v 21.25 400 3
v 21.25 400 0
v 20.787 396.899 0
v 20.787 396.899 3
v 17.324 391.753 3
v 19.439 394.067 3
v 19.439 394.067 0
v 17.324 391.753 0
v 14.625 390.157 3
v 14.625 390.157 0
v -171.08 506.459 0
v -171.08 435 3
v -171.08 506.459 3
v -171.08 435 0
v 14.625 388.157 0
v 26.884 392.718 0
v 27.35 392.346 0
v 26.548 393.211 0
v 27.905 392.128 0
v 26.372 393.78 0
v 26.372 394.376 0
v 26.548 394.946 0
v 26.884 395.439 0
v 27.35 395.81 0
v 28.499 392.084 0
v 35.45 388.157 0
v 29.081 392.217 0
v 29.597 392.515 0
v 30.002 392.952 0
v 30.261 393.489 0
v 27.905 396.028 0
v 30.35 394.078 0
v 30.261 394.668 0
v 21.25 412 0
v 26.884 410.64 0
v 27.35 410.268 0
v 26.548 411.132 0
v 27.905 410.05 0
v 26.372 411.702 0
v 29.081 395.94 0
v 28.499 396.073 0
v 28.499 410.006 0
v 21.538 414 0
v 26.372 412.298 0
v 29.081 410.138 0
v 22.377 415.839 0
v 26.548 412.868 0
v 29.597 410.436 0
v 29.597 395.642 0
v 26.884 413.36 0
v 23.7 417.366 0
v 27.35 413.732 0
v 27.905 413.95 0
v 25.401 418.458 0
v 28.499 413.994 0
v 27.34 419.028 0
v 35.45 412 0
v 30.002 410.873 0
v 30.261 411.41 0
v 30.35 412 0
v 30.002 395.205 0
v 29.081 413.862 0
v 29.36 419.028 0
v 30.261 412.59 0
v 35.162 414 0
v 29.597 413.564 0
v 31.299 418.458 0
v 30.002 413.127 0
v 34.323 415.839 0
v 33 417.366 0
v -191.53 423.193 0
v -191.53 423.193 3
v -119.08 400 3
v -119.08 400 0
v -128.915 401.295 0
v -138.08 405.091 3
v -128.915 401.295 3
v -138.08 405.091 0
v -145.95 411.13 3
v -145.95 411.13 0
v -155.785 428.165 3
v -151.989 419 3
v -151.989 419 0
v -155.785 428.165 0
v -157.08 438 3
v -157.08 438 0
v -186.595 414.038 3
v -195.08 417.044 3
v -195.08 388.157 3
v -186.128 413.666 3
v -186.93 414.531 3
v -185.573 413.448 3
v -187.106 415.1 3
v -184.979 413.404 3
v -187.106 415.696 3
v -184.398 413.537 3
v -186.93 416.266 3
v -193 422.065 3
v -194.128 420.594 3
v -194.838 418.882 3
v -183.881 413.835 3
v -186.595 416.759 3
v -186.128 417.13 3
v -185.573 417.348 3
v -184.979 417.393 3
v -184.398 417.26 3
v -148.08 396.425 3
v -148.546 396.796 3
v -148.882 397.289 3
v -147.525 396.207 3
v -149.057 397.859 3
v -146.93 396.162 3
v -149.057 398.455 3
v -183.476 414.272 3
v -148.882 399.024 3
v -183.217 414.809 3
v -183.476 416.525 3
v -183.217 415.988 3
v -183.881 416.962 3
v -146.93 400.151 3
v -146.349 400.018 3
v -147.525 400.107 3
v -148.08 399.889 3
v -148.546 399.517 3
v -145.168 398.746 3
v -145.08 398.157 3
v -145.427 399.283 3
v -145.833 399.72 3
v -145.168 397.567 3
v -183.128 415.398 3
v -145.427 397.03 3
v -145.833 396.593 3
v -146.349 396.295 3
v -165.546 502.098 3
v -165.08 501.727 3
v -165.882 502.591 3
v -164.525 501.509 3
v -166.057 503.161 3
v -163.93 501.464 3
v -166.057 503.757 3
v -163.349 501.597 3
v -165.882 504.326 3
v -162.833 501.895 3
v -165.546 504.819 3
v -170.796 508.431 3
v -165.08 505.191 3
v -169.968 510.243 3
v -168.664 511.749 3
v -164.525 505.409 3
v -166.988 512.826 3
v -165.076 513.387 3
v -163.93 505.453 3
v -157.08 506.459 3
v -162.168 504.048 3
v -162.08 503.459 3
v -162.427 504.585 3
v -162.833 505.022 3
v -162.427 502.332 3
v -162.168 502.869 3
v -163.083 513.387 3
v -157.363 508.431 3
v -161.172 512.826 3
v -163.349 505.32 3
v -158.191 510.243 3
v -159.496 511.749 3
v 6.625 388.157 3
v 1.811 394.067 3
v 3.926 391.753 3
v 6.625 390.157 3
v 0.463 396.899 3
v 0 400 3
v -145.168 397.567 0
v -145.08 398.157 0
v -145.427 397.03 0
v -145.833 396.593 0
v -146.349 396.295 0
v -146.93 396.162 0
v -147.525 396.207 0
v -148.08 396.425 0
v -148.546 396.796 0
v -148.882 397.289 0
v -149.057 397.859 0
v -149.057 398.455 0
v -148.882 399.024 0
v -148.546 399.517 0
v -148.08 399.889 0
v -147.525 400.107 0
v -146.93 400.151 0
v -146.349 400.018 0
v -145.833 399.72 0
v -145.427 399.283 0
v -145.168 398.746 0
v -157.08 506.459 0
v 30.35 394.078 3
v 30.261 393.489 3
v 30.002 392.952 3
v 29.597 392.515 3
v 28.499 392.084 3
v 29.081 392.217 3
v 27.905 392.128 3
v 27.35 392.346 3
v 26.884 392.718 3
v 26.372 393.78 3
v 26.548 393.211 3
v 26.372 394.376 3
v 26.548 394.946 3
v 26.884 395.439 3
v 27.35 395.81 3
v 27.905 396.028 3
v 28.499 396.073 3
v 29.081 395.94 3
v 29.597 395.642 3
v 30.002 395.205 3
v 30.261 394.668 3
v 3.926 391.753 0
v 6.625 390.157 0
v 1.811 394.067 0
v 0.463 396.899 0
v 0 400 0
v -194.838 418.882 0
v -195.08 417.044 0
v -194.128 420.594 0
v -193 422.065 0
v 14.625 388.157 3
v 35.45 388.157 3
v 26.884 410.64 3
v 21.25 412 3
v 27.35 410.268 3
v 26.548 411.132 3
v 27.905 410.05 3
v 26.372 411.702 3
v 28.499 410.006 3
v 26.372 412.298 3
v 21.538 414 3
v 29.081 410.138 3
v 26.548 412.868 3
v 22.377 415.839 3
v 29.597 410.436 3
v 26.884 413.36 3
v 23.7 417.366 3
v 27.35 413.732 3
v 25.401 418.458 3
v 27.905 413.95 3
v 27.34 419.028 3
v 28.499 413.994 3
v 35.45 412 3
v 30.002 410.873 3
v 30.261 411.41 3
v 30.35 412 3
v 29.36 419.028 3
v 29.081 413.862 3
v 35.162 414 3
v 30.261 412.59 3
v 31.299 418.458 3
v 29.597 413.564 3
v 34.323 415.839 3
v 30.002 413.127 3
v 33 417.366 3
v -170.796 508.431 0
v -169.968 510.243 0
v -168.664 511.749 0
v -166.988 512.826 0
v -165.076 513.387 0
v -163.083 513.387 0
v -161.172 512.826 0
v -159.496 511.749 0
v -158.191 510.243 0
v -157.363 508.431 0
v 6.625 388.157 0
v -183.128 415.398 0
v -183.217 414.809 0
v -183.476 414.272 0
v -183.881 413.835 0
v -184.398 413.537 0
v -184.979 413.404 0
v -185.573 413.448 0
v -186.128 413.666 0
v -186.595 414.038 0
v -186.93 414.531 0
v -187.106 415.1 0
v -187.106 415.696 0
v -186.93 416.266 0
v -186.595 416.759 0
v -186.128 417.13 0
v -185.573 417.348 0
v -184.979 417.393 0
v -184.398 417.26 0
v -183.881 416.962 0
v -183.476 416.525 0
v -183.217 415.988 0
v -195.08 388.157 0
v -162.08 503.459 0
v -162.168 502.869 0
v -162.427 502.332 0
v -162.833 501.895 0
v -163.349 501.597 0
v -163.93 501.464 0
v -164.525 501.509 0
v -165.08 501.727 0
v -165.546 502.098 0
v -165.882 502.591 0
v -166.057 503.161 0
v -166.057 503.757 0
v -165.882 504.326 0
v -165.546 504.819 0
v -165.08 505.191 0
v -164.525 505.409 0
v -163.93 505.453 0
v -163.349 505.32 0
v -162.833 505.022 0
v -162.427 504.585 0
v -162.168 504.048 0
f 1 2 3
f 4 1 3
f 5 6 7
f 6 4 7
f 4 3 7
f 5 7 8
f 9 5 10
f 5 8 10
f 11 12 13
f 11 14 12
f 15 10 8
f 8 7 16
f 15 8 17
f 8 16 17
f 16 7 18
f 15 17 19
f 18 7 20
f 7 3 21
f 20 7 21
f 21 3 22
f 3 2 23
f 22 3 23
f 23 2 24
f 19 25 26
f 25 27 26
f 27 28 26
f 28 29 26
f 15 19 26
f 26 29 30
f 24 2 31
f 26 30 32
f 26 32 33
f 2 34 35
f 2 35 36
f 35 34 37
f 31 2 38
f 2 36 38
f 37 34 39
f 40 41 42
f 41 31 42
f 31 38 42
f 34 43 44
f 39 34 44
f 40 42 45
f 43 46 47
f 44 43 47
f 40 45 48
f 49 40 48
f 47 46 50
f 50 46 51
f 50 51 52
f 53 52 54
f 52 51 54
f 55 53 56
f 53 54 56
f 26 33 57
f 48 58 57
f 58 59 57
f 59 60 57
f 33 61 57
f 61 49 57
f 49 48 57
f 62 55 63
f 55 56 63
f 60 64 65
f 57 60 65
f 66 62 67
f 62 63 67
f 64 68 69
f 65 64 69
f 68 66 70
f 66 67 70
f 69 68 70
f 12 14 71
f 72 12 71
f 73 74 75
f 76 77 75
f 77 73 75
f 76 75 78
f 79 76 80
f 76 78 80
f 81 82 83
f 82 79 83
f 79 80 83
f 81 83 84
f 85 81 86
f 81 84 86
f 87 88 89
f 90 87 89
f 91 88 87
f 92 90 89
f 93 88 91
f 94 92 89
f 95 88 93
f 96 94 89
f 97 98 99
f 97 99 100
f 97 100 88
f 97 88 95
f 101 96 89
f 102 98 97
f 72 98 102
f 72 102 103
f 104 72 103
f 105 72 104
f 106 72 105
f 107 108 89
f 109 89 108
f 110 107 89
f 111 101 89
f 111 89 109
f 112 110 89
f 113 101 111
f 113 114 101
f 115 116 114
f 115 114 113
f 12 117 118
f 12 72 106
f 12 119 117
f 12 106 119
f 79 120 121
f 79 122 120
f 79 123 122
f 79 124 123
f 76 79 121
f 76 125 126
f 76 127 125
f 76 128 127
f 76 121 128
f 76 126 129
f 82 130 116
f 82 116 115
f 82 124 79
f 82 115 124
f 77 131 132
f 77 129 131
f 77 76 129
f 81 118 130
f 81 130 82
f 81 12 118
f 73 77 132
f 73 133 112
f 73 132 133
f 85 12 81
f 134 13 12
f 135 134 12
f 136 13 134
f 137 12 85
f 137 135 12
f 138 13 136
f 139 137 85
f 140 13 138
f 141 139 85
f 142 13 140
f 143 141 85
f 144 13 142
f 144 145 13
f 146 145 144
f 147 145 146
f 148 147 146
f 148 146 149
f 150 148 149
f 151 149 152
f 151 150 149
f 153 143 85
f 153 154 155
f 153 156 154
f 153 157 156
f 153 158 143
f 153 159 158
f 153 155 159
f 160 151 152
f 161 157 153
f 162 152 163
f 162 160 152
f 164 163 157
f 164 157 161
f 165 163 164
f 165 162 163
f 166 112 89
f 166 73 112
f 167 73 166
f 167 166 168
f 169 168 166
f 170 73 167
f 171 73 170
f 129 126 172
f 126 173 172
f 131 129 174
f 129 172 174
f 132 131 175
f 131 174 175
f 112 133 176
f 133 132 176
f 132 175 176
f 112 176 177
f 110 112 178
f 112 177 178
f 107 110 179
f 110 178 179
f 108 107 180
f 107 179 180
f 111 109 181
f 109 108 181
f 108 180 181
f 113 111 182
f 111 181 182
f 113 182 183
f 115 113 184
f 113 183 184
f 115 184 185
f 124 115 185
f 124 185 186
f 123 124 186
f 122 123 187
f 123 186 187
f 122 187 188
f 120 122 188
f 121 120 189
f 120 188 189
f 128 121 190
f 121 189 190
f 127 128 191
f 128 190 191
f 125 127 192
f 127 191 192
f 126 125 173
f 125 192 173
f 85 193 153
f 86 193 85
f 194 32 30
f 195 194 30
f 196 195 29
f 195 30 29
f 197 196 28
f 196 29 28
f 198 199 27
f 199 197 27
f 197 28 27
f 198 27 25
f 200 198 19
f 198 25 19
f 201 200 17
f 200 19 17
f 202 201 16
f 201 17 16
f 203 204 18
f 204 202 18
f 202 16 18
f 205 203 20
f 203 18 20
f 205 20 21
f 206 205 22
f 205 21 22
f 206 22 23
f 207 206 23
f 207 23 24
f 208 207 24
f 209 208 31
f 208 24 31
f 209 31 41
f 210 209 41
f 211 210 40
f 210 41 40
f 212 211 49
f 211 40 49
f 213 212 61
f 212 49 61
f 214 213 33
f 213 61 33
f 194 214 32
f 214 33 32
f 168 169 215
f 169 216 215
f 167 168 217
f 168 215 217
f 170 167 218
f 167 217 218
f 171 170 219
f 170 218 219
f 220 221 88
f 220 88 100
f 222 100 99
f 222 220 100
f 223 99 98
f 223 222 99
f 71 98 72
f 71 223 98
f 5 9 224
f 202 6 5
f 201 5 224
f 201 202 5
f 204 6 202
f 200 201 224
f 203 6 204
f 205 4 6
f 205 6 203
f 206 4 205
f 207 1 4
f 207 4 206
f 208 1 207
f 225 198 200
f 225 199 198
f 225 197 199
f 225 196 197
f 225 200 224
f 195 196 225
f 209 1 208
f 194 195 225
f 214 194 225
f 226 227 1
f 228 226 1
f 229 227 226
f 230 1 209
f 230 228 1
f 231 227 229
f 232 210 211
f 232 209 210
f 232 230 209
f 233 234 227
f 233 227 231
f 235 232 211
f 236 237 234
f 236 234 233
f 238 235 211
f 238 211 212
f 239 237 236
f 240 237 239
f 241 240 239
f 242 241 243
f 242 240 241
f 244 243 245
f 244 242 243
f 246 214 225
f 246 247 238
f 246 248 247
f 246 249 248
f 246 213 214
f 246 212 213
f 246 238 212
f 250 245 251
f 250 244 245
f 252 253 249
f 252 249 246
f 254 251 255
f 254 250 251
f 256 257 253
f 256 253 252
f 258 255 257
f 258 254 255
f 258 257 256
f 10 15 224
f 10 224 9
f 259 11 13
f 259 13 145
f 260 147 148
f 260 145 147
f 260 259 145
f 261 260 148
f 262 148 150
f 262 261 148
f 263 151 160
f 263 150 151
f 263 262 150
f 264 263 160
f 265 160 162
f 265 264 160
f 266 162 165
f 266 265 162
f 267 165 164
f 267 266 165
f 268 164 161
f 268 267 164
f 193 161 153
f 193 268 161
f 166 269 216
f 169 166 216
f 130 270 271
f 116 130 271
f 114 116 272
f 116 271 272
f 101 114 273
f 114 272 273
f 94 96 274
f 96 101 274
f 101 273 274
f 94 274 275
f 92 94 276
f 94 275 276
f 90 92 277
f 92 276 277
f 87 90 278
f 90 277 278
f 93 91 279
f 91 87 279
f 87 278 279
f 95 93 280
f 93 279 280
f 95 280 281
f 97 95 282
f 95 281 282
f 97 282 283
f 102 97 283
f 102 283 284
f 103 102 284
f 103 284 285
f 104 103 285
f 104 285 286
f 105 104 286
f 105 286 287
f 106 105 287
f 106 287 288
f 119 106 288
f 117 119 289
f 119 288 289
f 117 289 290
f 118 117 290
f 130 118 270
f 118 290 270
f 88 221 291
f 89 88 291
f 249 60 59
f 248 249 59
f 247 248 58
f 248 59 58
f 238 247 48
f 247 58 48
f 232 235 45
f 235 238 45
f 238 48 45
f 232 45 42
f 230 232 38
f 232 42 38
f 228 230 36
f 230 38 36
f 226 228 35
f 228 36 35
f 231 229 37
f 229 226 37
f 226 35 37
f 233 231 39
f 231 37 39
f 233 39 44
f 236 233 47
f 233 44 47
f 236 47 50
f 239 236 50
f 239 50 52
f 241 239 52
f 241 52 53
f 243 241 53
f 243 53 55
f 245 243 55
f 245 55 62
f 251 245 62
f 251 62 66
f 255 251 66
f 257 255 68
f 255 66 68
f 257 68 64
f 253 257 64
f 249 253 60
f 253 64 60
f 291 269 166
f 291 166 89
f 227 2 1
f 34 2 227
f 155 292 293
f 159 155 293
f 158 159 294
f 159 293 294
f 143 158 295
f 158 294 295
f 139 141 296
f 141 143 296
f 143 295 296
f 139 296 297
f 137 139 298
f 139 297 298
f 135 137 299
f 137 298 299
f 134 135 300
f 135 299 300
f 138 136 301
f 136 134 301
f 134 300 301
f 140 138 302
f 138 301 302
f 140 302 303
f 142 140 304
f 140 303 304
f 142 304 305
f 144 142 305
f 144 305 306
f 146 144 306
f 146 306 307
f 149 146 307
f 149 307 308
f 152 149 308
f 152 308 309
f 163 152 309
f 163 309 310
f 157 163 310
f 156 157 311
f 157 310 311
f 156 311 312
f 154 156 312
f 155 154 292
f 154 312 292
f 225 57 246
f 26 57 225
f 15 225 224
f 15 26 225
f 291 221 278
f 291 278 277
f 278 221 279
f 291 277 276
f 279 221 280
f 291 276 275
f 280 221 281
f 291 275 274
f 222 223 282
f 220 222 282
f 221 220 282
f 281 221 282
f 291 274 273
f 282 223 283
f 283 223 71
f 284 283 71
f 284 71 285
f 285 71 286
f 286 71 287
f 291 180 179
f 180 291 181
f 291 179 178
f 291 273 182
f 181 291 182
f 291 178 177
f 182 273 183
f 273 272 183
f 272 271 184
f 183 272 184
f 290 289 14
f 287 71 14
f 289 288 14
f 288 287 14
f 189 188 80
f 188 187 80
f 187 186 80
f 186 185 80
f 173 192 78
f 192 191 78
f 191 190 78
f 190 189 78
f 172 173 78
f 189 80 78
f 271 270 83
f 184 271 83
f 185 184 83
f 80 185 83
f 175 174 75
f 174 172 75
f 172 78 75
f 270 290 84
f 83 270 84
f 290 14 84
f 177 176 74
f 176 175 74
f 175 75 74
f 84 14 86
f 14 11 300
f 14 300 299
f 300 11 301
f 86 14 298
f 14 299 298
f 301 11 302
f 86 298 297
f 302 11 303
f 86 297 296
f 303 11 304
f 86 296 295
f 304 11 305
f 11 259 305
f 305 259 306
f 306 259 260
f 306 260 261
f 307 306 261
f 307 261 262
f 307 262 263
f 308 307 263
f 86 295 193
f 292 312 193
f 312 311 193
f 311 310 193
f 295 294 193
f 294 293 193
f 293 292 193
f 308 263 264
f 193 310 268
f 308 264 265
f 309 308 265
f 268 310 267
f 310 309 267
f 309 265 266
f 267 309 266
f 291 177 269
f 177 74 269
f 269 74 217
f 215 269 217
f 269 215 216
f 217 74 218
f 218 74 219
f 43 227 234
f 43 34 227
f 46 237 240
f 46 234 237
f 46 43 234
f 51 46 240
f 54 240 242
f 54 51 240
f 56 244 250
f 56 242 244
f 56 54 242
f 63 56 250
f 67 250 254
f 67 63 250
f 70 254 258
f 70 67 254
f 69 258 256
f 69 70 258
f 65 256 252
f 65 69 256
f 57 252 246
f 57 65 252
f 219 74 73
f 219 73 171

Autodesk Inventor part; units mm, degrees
ref_plane "YZ Plane" through (0, 0, 0) normal (1, 0, 0) x (0, 1, 0)
ref_plane "XZ Plane" through (0, 0, 0) normal (0, 1, 0) x (-1, 0, 0)
ref_plane "XY Plane" through (0, 0, 0) normal (0, 0, 1) x (1, 0, 0)
sketch "Sketch3" plane through (0, 0, 0) normal (0, 0, 1) x (1, 0, 0)
  circle A0 centre (367.816, 50) radius 50 construction
  line L0 (367.816, 0) -> (512.7041, 0) construction
  line L1 (367.816, 50) -> (512.7041, 50) construction
  line L2 (367.816, 100) -> (512.7041, 100) construction
  line L3 (367.816, 50) -> (342.816, 6.6987) construction
  line L4 (367.816, 50) -> (324.5147, 25) construction
  line L5 (367.816, 50) -> (324.5147, 75) construction
  line L6 (342.816, 93.3013) -> (367.816, 50) construction
  line L7 (392.816, 93.3013) -> (367.816, 50) construction
  line L8 (411.1173, 75) -> (367.816, 50) construction
  line L9 (411.1173, 25) -> (367.816, 50) construction
  line L10 (392.816, 6.6987) -> (367.816, 50) construction
  line L11 (367.816, 0) -> (367.816, 100) construction
  line L12 (417.816, 50) -> (367.816, 50) construction
  line L13 (341.6361, 0) -> (341.6361, 100) construction
  line L14 (315.4561, 0) -> (315.4561, 100) construction
  line L15 (289.2762, 0) -> (289.2762, 100) construction
  line L16 (263.0963, 0) -> (263.0963, 100) construction
  line L17 (236.9163, 0) -> (236.9163, 100) construction
  line L18 (210.7364, 0) -> (210.7364, 100) construction
  line L19 (184.5564, 0) -> (184.5564, 100) construction
  line L20 (158.3765, 0) -> (158.3765, 100) construction
  circle A1 centre (315.4561, 50) radius 50 construction
  circle A2 centre (341.6361, 50) radius 50 construction
  circle A3 centre (289.2762, 50) radius 50 construction
  circle A4 centre (263.0963, 50) radius 50 construction
  circle A5 centre (236.9163, 50) radius 50 construction
  circle A6 centre (210.7364, 50) radius 50 construction
  line L21 (392.816, 6.6987) -> (512.7041, 6.6987) construction
  line L22 (411.1173, 25) -> (512.7041, 25) construction
  line L23 (411.1173, 75) -> (512.7041, 75) construction
  line L24 (411.1173, 75) -> (512.7041, 75) construction
  line L25 (392.816, 93.3013) -> (512.7041, 93.3013) construction
  line L26 (358.7574, 75) -> (339.2762, 50) construction
  line L27 (339.2762, 50) -> (306.3975, 25) construction
  line L28 (306.3975, 25) -> (261.9163, 6.6987) construction
  line L29 (261.9163, 6.6987) -> (210.7364, 0) construction
  line L30 (105.3682, -12.9392) -> (105.3682, 124.4333) construction
  line L31 (21.25, 0) -> (21.25, 12)
  line L32 (35.45, 12) -> (35.45, -11.8433)
  arc A7 (0, 0) -> (6.625, -9.8433) centre (10.625, 0) ccw
  arc A8 (14.625, -9.8433) -> (21.25, 0) centre (10.625, 0) ccw
  line L33 (35.45, -11.8433) -> (14.625, -11.8433)
  line L34 (6.625, -11.8433) -> (-195.0796, -11.8433)
  circle A9 centre (-144.26, 100.8473) radius 12.875 construction
  line L35 (6.625, -11.8433) -> (6.625, -9.8433)
  line L36 (14.625, -11.8433) -> (14.625, -9.8433)
  line L37 (411.1173, 75) -> (158.3765, 75) construction
  line L38 (367.816, 100) -> (158.3765, 100) construction
  line L39 (417.816, 50) -> (158.3765, 50) construction
  line L40 (411.1173, 25) -> (158.3765, 25) construction
  line L41 (392.816, 6.6987) -> (158.3765, 6.6987) construction
  line L42 (392.816, 93.3013) -> (158.3765, 93.3013) construction
  line L43 (358.7574, 75) -> (366.6361, 93.3013) construction
  line L44 (366.6361, 93.3013) -> (367.816, 100) construction
  spline S0 degree 4 poles (-157.0796, 100) (-157.0796, 88.9946) (-147.011, 72.6811) (-131.8577, 48.7932) (-88.4777, 17.6268) (-50.0176, 3.937) (-18.8717, 0) (0, 0) knots 0 0 0 0 0 0.264547 0.457223 0.66608 1 1 1 1 1
  line L45 (-157.0796, 100) -> (-157.0796, 38) construction
  line L46 (0, 0) -> (-157.0796, 0) construction
  line L47 (-144.26, 100.8473) -> (-157.135, 100.8473) construction
  circle A10 centre (-146.4546, 100) radius 10.625 construction
  line L48 (-146.4546, 100) -> (-157.0796, 100) construction
  line L49 (-141.0754, 84.4005) -> (-135.6205, 93.5183) construction
  line L50 (-141.0796, 132.0528) -> (-171.0796, 149.3733) construction
  line L51 (-171.0796, 149.3733) -> (-201.0796, 132.0528) construction
  line L52 (-141.0754, 84.4005) -> (-99.2801, 84.4005) construction
  line L53 (-201.0796, 132.0528) -> (-201.0796, 97.4118) construction
  line L54 (-201.0796, 97.4118) -> (-171.0796, 80.0913) construction
  line L55 (0, 0) -> (-157.0796, 93.9753) construction
  line L56 (-135.6205, 93.5183) -> (-137.3368, 94.5451) construction
  line L57 (-137.3368, 94.5451) -> (-143.2815, 84.6085) construction
  line L58 (-137.3368, 94.5451) -> (-171.0796, 114.7323) construction
  line L59 (-201.0796, 132.0528) -> (-171.0796, 114.7323) construction
  arc A11 (-137.3368, 94.5451) -> (-144.7045, 143.8948) centre (-171.0796, 114.7323) ccw construction
  arc A12 (-142.7917, 85.4273) -> (-147.1443, 147.6882) centre (-171.0796, 114.7323) ccw construction
  line L60 (-171.0796, 80.0913) -> (-171.0796, 35)
  circle A13 centre (-171.0796, 114.7323) radius 2.5 construction
  arc A14 (-167.4345, 120.8251) -> (-174.7248, 108.6394) centre (-171.0796, 114.7323) ccw construction
  line L61 (-167.4345, 120.8251) -> (-157.0796, 114.6302) construction
  line L62 (-171.0796, 80.0913) -> (-171.0796, 106.4587)
  line L63 (-171.0796, 106.4587) -> (-174.7248, 108.6394) construction
  line L64 (-171.0796, 35) -> (-191.5296, 23.1932)
  arc A15 (-191.5296, 23.1932) -> (-195.0796, 17.0444) centre (-187.9796, 17.0444) ccw
  line L65 (-195.0796, 17.0444) -> (-195.0796, -11.8433)
  arc A16 (35.45, 12) -> (21.25, 12) centre (28.35, 12) ccw
  line L66 (-157.0796, 114.6302) -> (-157.0796, 99.9865) construction
  circle A17 centre (-164.0796, 103.4587) radius 2
  line L67 (-171.0796, 103.4587) -> (-157.0796, 103.4587) construction
  circle A18 centre (-185.1284, 15.3983) radius 2
  line L68 (-185.1284, 15.3983) -> (-194.1284, 20.5944) construction
  circle A19 centre (-6, -5.9217) radius 2
  line L69 (-6, -11.8433) -> (-6, 0) construction
  circle A20 centre (28.35, 12) radius 2
  circle A21 centre (28.35, -5.9217) radius 2
  line L70 (-167.4345, 320.8251) -> (-157.0796, 314.6302) construction
  arc A22 (-167.4345, 320.8251) -> (-174.7248, 308.6394) centre (-171.0796, 314.7323) ccw construction
  circle A23 centre (-171.0796, 314.7323) radius 2.5 construction
  line L71 (-171.0796, 280.0913) -> (-171.0796, 306.4587)
  line L72 (-171.0796, 306.4587) -> (-174.7248, 308.6394) construction
  line L73 (-157.0796, 314.6302) -> (-157.0796, 299.9865) construction
  circle A24 centre (-164.0796, 303.4587) radius 2
  spline S1 degree 4 poles (-157.0796, 300) (-157.0796, 288.9946) (-147.0234, 272.6841) (-124.1789, 236.7977) (-70.8039, 208.0704) (-31.8865, 200.2943) (0, 200) knots 0 0 0 0 0 0.264547 0.457223 1 1 1 1 1 construction
  line L74 (-157.0796, 300) -> (-157.0796, 238) construction
  arc A25 (0, 200) -> (6.625, 190.1567) centre (10.625, 200) ccw
  line L75 (35.45, 212) -> (35.45, 188.1567)
  circle A26 centre (28.35, 212) radius 2
  circle A27 centre (28.35, 194.0783) radius 2
  arc A28 (35.45, 212) -> (21.25, 212) centre (28.35, 212) ccw
  line L76 (21.25, 200) -> (21.25, 212)
  line L77 (35.45, 188.1567) -> (14.625, 188.1567)
  arc A29 (14.625, 190.1567) -> (21.25, 200) centre (10.625, 200) ccw
  line L78 (14.625, 188.1567) -> (14.625, 190.1567)
  line L79 (-185.1284, 215.3983) -> (-194.1284, 220.5944) construction
  arc A30 (-191.5296, 223.1932) -> (-195.0796, 217.0444) centre (-187.9796, 217.0444) ccw
  line L80 (-195.0796, 217.0444) -> (-195.0796, 188.1567)
  line L81 (-171.0796, 235) -> (-191.5296, 223.1932)
  circle A31 centre (-185.1284, 215.3983) radius 2
  line L82 (-171.0796, 280.0913) -> (-171.0796, 235)
  line L83 (6.625, 188.1567) -> (-195.0796, 188.1567)
  line L84 (6.625, 188.1567) -> (6.625, 190.1567)
  line L85 (-137.3368, 294.5451) -> (-143.2815, 284.6085) construction
  line L86 (-141.0754, 284.4005) -> (-135.6205, 293.5183) construction
  line L87 (0, 200) -> (-157.0796, 293.9753)
  line L88 (-167.4345, 520.8251) -> (-157.0796, 514.6302) construction
  arc A32 (-167.4345, 520.8251) -> (-174.7248, 508.6394) centre (-171.0796, 514.7323) ccw construction
  circle A33 centre (-171.0796, 514.7323) radius 2.5 construction
  line L89 (-171.0796, 480.0913) -> (-171.0796, 506.4587)
  line L90 (-171.0796, 506.4587) -> (-174.7248, 508.6394) construction
  line L91 (-157.0796, 514.6302) -> (-157.0796, 499.9865) construction
  circle A34 centre (-164.0796, 503.4587) radius 2
  spline S2 degree 4 poles (-157.0796, 500) (-157.0796, 488.9946) (-147.0234, 472.6841) (-124.1789, 436.7977) (-70.8039, 408.0704) (-31.8865, 400.2943) (0, 400) knots 0 0 0 0 0 0.264547 0.457223 1 1 1 1 1 construction
  line L92 (-157.0796, 500) -> (-157.0796, 438)
  arc A35 (0, 400) -> (6.625, 390.1567) centre (10.625, 400) ccw
  line L93 (35.45, 412) -> (35.45, 388.1567)
  circle A36 centre (28.35, 412) radius 2
  circle A37 centre (28.35, 394.0783) radius 2
  arc A38 (35.45, 412) -> (21.25, 412) centre (28.35, 412) ccw
  line L94 (21.25, 400) -> (21.25, 412)
  line L95 (35.45, 388.1567) -> (14.625, 388.1567)
  arc A39 (14.625, 390.1567) -> (21.25, 400) centre (10.625, 400) ccw
  line L96 (14.625, 388.1567) -> (14.625, 390.1567)
  line L97 (-185.1284, 415.3983) -> (-194.1284, 420.5944) construction
  arc A40 (-191.5296, 423.1932) -> (-195.0796, 417.0444) centre (-187.9796, 417.0444) ccw
  line L98 (-195.0796, 417.0444) -> (-195.0796, 388.1567)
  line L99 (-171.0796, 435) -> (-191.5296, 423.1932)
  circle A41 centre (-185.1284, 415.3983) radius 2
  line L100 (-171.0796, 480.0913) -> (-171.0796, 435)
  line L101 (6.625, 388.1567) -> (-195.0796, 388.1567)
  line L102 (6.625, 388.1567) -> (6.625, 390.1567)
  line L103 (-137.3368, 494.5451) -> (-143.2815, 484.6085) construction
  line L104 (-141.0754, 484.4005) -> (-135.6205, 493.5183) construction
  line L105 (0, 400) -> (-157.0796, 493.9753) construction
  line L106 (-467.4345, 120.8251) -> (-457.0796, 114.6302) construction
  arc A42 (-467.4345, 120.8251) -> (-474.7248, 108.6394) centre (-471.0796, 114.7323) ccw construction
  circle A43 centre (-471.0796, 114.7323) radius 2.5 construction
  line L107 (-471.0796, 80.0913) -> (-471.0796, 106.4587)
  line L108 (-471.0796, 106.4587) -> (-474.7248, 108.6394) construction
  line L109 (-457.0796, 114.6302) -> (-457.0796, 99.9865) construction
  circle A44 centre (-464.0796, 103.4587) radius 2
  spline S3 degree 4 poles (-457.0796, 100) (-457.0796, 88.9946) (-447.0234, 72.6841) (-424.1789, 36.7977) (-370.8039, 8.0704) (-331.8865, 0.2943) (-300, 0) knots 0 0 0 0 0 0.264547 0.457223 1 1 1 1 1 construction
  line L110 (-457.0796, 100) -> (-457.0796, 38) construction
  arc A45 (-300, 0) -> (-293.375, -9.8433) centre (-289.375, 0) ccw construction
  line L111 (-264.55, 12) -> (-264.55, -11.8433)
  circle A46 centre (-271.65, 12) radius 2
  circle A47 centre (-271.65, -5.9217) radius 2
  arc A48 (-264.55, 12) -> (-278.75, 12) centre (-271.65, 12) ccw
  line L112 (-278.75, 0) -> (-278.75, 12) construction
  line L113 (-264.55, -11.8433) -> (-285.375, -11.8433)
  arc A49 (-285.375, -9.8433) -> (-278.75, 0) centre (-289.375, 0) ccw construction
  line L114 (-285.375, -11.8433) -> (-285.375, -9.8433) construction
  line L115 (-485.1284, 15.3983) -> (-494.1284, 20.5944) construction
  arc A50 (-491.5296, 23.1932) -> (-495.0796, 17.0444) centre (-487.9796, 17.0444) ccw
  line L116 (-495.0796, 17.0444) -> (-495.0796, -11.8433)
  line L117 (-471.0796, 35) -> (-491.5296, 23.1932)
  circle A51 centre (-485.1284, 15.3983) radius 2
  line L118 (-471.0796, 80.0913) -> (-471.0796, 35)
  line L119 (-293.375, -11.8433) -> (-495.0796, -11.8433)
  line L120 (-293.375, -11.8433) -> (-293.375, -9.8433) construction
  line L121 (-437.3368, 94.5451) -> (-443.2815, 84.6085) construction
  line L122 (-441.0754, 84.4005) -> (-435.6205, 93.5183) construction
  line L123 (-300, 0) -> (-457.0796, 93.9753) construction
  line L124 (-467.4345, 320.8251) -> (-457.0796, 314.6302) construction
  arc A52 (-467.4345, 320.8251) -> (-474.7248, 308.6394) centre (-471.0796, 314.7323) ccw construction
  circle A53 centre (-471.0796, 314.7323) radius 2.5 construction
  line L125 (-471.0796, 280.0913) -> (-471.0796, 306.4587)
  line L126 (-471.0796, 306.4587) -> (-474.7248, 308.6394) construction
  line L127 (-457.0796, 314.6302) -> (-457.0796, 299.9865) construction
  circle A54 centre (-464.0796, 303.4587) radius 2
  spline S4 degree 4 poles (-457.0796, 300) (-457.0796, 288.9946) (-447.0234, 272.6841) (-424.1789, 236.7977) (-370.8039, 208.0704) (-331.8865, 200.2943) (-300, 200) knots 0 0 0 0 0 0.264547 0.457223 1 1 1 1 1 construction
  line L128 (-457.0796, 300) -> (-457.0796, 238) construction
  arc A55 (-300, 200) -> (-293.375, 190.1567) centre (-289.375, 200) ccw construction
  line L129 (-264.55, 212) -> (-264.55, 188.1567)
  circle A56 centre (-271.65, 212) radius 2
  circle A57 centre (-271.65, 194.0783) radius 2
  arc A58 (-264.55, 212) -> (-278.75, 212) centre (-271.65, 212) ccw
  line L130 (-278.75, 200) -> (-278.75, 212) construction
  line L131 (-264.55, 188.1567) -> (-285.375, 188.1567)
  arc A59 (-285.375, 190.1567) -> (-278.75, 200) centre (-289.375, 200) ccw construction
  line L132 (-285.375, 188.1567) -> (-285.375, 190.1567) construction
  line L133 (-485.1284, 215.3983) -> (-494.1284, 220.5944) construction
  arc A60 (-491.5296, 223.1932) -> (-495.0796, 217.0444) centre (-487.9796, 217.0444) ccw
  line L134 (-495.0796, 217.0444) -> (-495.0796, 188.1567)
  line L135 (-471.0796, 235) -> (-491.5296, 223.1932)
  circle A61 centre (-485.1284, 215.3983) radius 2
  line L136 (-471.0796, 280.0913) -> (-471.0796, 235)
  line L137 (-293.375, 188.1567) -> (-495.0796, 188.1567)
  line L138 (-293.375, 188.1567) -> (-293.375, 190.1567) construction
  line L139 (-437.3368, 294.5451) -> (-443.2815, 284.6085) construction
  line L140 (-441.0754, 284.4005) -> (-435.6205, 293.5183) construction
  line L141 (-300, 200) -> (-457.0796, 293.9753) construction
  line L142 (-467.4345, 520.8251) -> (-457.0796, 514.6302)
  arc A62 (-467.4345, 520.8251) -> (-474.7248, 508.6394) centre (-471.0796, 514.7323) ccw
  circle A63 centre (-471.0796, 514.7323) radius 2.5
  line L143 (-471.0796, 480.0913) -> (-471.0796, 506.4587)
  line L144 (-471.0796, 506.4587) -> (-474.7248, 508.6394)
  line L145 (-457.0796, 514.6302) -> (-457.0796, 499.9865)
  circle A64 centre (-464.0796, 503.4587) radius 2
  spline S5 degree 4 poles (-457.0796, 500) (-457.0796, 488.9946) (-447.0234, 472.6841) (-424.1789, 436.7977) (-370.8039, 408.0704) (-331.8865, 400.2943) (-300, 400) knots 0 0 0 0 0 0.264547 0.457223 1 1 1 1 1 construction
  line L146 (-457.0796, 500) -> (-457.0796, 438) construction
  arc A65 (-300, 400) -> (-293.375, 390.1567) centre (-289.375, 400) ccw construction
  line L147 (-264.55, 412) -> (-264.55, 388.1567) construction
  circle A66 centre (-271.65, 412) radius 2
  circle A67 centre (-271.65, 394.0783) radius 2
  arc A68 (-264.55, 412) -> (-278.75, 412) centre (-271.65, 412) ccw
  line L148 (-278.75, 400) -> (-278.75, 412) construction
  line L149 (-264.55, 388.1567) -> (-285.375, 388.1567)
  arc A69 (-285.375, 390.1567) -> (-278.75, 400) centre (-289.375, 400) ccw construction
  line L150 (-285.375, 388.1567) -> (-285.375, 390.1567) construction
  line L151 (-485.1284, 415.3983) -> (-494.1284, 420.5944) construction
  arc A70 (-491.5296, 423.1932) -> (-495.0796, 417.0444) centre (-487.9796, 417.0444) ccw
  line L152 (-495.0796, 417.0444) -> (-495.0796, 388.1567) construction
  line L153 (-471.0796, 435) -> (-491.5296, 423.1932)
  circle A71 centre (-485.1284, 415.3983) radius 2
  line L154 (-471.0796, 480.0913) -> (-471.0796, 435)
  line L155 (-293.375, 388.1567) -> (-495.0796, 388.1567)
  line L156 (-293.375, 388.1567) -> (-293.375, 390.1567) construction
  line L157 (-437.3368, 494.5451) -> (-443.2815, 484.6085) construction
  line L158 (-441.0754, 484.4005) -> (-435.6205, 493.5183) construction
  line L159 (-300, 400) -> (-457.0796, 493.9753) construction
  line L160 (-435.4304, 87.048) -> (-430.3073, 83.9831)
  line L161 (-430.3073, 83.9831) -> (-430.3073, 78.0131)
  line L162 (-457.0796, 100) -> (-443.128, 91.6532)
  line L163 (-443.2208, 85.684) -> (-443.128, 91.6532)
  line L164 (-440.6463, 84.1438) -> (-435.4304, 87.048)
  line L165 (-440.6463, 84.1438) -> (-443.2208, 85.684)
  line L166 (-430.3073, 78.0131) -> (-436.0283, 74.7101)
  line L167 (-436.0283, 74.7101) -> (-436.0283, 68.1041)
  spline S6 degree 4 poles (-439.3753, 72.7777) (-420.1522, 45.3403) (-398.6357, 22.4496) (-337.1208, 4.2654) (-300, 5.1701) knots 0 0 0 0 0 1 1 1 1 1
  line L168 (-293.375, -11.8433) -> (-285.375, -11.8433)
  line L169 (-157.0796, 293.9753) -> (-157.0796, 300)
  line L170 (-293.375, 188.1567) -> (-285.375, 188.1567)
  arc A72 (-157.0796, 438) -> (-119.0796, 400) centre (-119.0796, 438) ccw
  line L171 (-119.0796, 400) -> (0, 400)
  line L172 (-457.0796, 500) -> (-457.0796, 438) construction
  line L173 (-419.0796, 400) -> (-300, 400) construction
  arc A73 (-457.0796, 438) -> (-419.0796, 400) centre (-419.0796, 438) ccw construction
  line L174 (-457.0796, 300) -> (-443.128, 291.6532)
  line L175 (-443.2208, 285.684) -> (-443.128, 291.6532)
  line L176 (-440.6463, 284.1438) -> (-443.2208, 285.684)
  line L177 (-440.6463, 284.1438) -> (-435.4304, 287.048)
  line L178 (-435.4304, 287.048) -> (-430.3073, 283.9831)
  line L179 (-430.3073, 283.9831) -> (-430.3073, 278.0131) construction
  line L180 (-430.3073, 278.0131) -> (-436.0283, 274.7101) construction
  line L181 (-457.0796, 500) -> (-443.128, 491.6532)
  line L182 (-443.2208, 485.684) -> (-443.128, 491.6532)
  line L183 (-440.6463, 484.1438) -> (-443.2208, 485.684)
  line L184 (-440.6463, 484.1438) -> (-435.4304, 487.048)
  line L185 (-435.4304, 487.048) -> (-430.3073, 483.9831)
  line L186 (-430.3073, 483.9831) -> (-430.3073, 478.0131)
  line L187 (-430.3073, 478.0131) -> (-436.0283, 474.7101)
  line L188 (-430.3073, 283.9831) -> (-298.5715, 205.1701)
  line L189 (-293.375, 388.1567) -> (-285.375, 388.1567)
  line L190 (-300, 5.1701) -> (-285.5799, 5.1701)
  arc A74 (-285.5799, 5.1701) -> (-278.75, 12) centre (-285.5799, 12) ccw
  line L191 (-298.5715, 205.1701) -> (-285.5799, 205.1701)
  arc A75 (-285.5799, 205.1701) -> (-278.75, 212) centre (-285.5799, 212) ccw
  line L192 (-436.0283, 474.7101) -> (-451.9095, 465.5411)
  line L193 (-451.9095, 465.5411) -> (-451.9095, 438)
  arc A76 (-451.9095, 438) -> (-419.0796, 405.1701) centre (-419.0796, 438) ccw
  line L194 (-419.0796, 405.1701) -> (-285.5799, 405.1701)
  arc A77 (-285.5799, 405.1701) -> (-278.75, 412) centre (-285.5799, 412) ccw
  line L195 (-495.0796, 388.1567) -> (-514.2796, 388.1567)
  line L196 (-514.2796, 388.1567) -> (-514.2796, 392.1567)
  line L197 (-514.2796, 392.1567) -> (-498.0796, 392.1567)
  arc A78 (-498.0796, 392.1567) -> (-495.0796, 395.1567) centre (-498.0796, 395.1567) ccw
  line L198 (-495.0796, 395.1567) -> (-495.0796, 417.0444)
  line L199 (-499.0796, 388.1567) -> (-510.2796, 388.1567) construction
  line L200 (-510.2796, 388.1567) -> (-510.2796, 392.1567) construction
  line L201 (-510.2796, 392.1567) -> (-499.0796, 392.1567) construction
  line L202 (-499.0796, 392.1567) -> (-499.0796, 388.1567) construction
  line L203 (-499.0796, 388.1567) -> (-510.2796, 392.1567) construction
  line L204 (-510.2796, 388.1567) -> (-499.0796, 392.1567) construction
  arc A79 (-600, 200) -> (-593.375, 190.1567) centre (-589.375, 200) ccw construction
  line L205 (-564.55, 212) -> (-564.55, 188.1567) construction
  circle A80 centre (-571.65, 212) radius 2
  circle A81 centre (-571.65, 194.0783) radius 2
  arc A82 (-564.55, 212) -> (-578.75, 212) centre (-571.65, 212) ccw
  line L206 (-578.75, 200) -> (-578.75, 212) construction
  line L207 (-564.55, 188.1567) -> (-585.375, 188.1567)
  arc A83 (-585.375, 190.1567) -> (-578.75, 200) centre (-589.375, 200) ccw construction
  line L208 (-585.375, 188.1567) -> (-585.375, 190.1567) construction
  line L209 (-593.375, 188.1567) -> (-593.375, 190.1567) construction
  arc A84 (-585.5799, 205.1701) -> (-578.75, 212) centre (-585.5799, 212) ccw
  line L210 (-593.375, 188.1567) -> (-585.375, 188.1567)
  line L211 (-598.5715, 205.1701) -> (-585.5799, 205.1701)
  arc A85 (-791.5296, 223.1932) -> (-795.0796, 217.0444) centre (-787.9796, 217.0444) ccw
  line L212 (-785.1284, 215.3983) -> (-794.1284, 220.5944) construction
  circle A86 centre (-785.1284, 215.3983) radius 2
  line L213 (-771.0796, 235) -> (-791.5296, 223.1932)
  line L214 (-795.0796, 217.0444) -> (-795.0796, 188.1567) construction
  line L215 (-730.3073, 278.0131) -> (-736.0283, 274.7101) construction
  line L216 (-757.0796, 300) -> (-757.0796, 238) construction
  line L217 (-730.3073, 283.9831) -> (-730.3073, 278.0131) construction
  line L218 (-730.3073, 283.9831) -> (-598.5715, 205.1701)
  line L219 (-600, 200) -> (-757.0796, 293.9753) construction
  spline S7 degree 4 poles (-757.0796, 300) (-757.0796, 288.9946) (-747.0234, 272.6841) (-724.1789, 236.7977) (-670.8039, 208.0704) (-631.8865, 200.2943) (-600, 200) knots 0 0 0 0 0 0.264547 0.457223 1 1 1 1 1 construction
  line L220 (-593.375, 188.1567) -> (-795.0796, 188.1567)
  line L221 (-771.0796, 280.0913) -> (-771.0796, 235)
  line L222 (-757.0796, 300) -> (-743.128, 291.6532)
  line L223 (-743.2208, 285.684) -> (-743.128, 291.6532)
  line L224 (-740.6463, 284.1438) -> (-743.2208, 285.684)
  line L225 (-737.3368, 294.5451) -> (-743.2815, 284.6085) construction
  line L226 (-741.0754, 284.4005) -> (-735.6205, 293.5183) construction
  line L227 (-740.6463, 284.1438) -> (-735.4304, 287.048)
  line L228 (-735.4304, 287.048) -> (-730.3073, 283.9831)
  line L229 (-767.4345, 320.8251) -> (-757.0796, 314.6302)
  line L230 (-771.0796, 280.0913) -> (-771.0796, 306.4587)
  line L231 (-757.0796, 314.6302) -> (-757.0796, 299.9865)
  circle A87 centre (-764.0796, 303.4587) radius 2
  line L232 (-771.0796, 306.4587) -> (-774.7248, 308.6394)
  circle A88 centre (-771.0796, 314.7323) radius 2.5
  arc A89 (-767.4345, 320.8251) -> (-774.7248, 308.6394) centre (-771.0796, 314.7323) ccw
  line L233 (-795.0796, 188.1567) -> (-814.2796, 188.1567)
  line L234 (-814.2796, 188.1567) -> (-814.2796, 192.1567)
  line L235 (-814.2796, 192.1567) -> (-798.0796, 192.1567)
  arc A90 (-798.0796, 192.1567) -> (-795.0796, 195.1567) centre (-798.0796, 195.1567) ccw
  line L236 (-795.0796, 195.1567) -> (-795.0796, 217.0444)
  line L237 (-799.0796, 188.1567) -> (-810.2796, 188.1567) construction
  line L238 (-810.2796, 188.1567) -> (-810.2796, 192.1567) construction
  line L239 (-810.2796, 192.1567) -> (-799.0796, 192.1567) construction
  line L240 (-799.0796, 192.1567) -> (-799.0796, 188.1567) construction
  line L241 (-799.0796, 188.1567) -> (-810.2796, 192.1567) construction
  line L242 (-810.2796, 188.1567) -> (-799.0796, 192.1567) construction
  line L243 (-495.0796, 587.6927) -> (-264.55, 587.6927) construction
  line L244 (-379.8148, 587.6927) -> (-379.8148, 614.3146) construction
  line L245 (-795.0796, 438) -> (-564.55, 438) construction
  line L246 (-679.8148, 438) -> (-679.8148, 492.8294) construction
  arc A91 (-564.55, 195.1567) -> (-561.55, 192.1567) centre (-561.55, 195.1567) ccw
  line L247 (-545.35, 192.1567) -> (-561.55, 192.1567)
  line L248 (-545.35, 188.1567) -> (-545.35, 192.1567)
  line L249 (-560.55, 192.1567) -> (-560.55, 188.1567) construction
  line L250 (-560.55, 188.1567) -> (-549.35, 188.1567) construction
  line L251 (-564.55, 188.1567) -> (-545.35, 188.1567)
  line L252 (-549.35, 188.1567) -> (-549.35, 192.1567) construction
  line L253 (-549.35, 192.1567) -> (-560.55, 192.1567) construction
  line L254 (-560.55, 188.1567) -> (-549.35, 192.1567) construction
  line L255 (-549.35, 188.1567) -> (-560.55, 192.1567) construction
  line L256 (-564.55, 195.1567) -> (-564.55, 212)
  circle A92 centre (-147.0796, 398.1567) radius 2
  circle A93 centre (-147.0796, 198.1567) radius 2
  circle A94 centre (-147.0796, -1.8433) radius 2
  circle A95 centre (-447.0796, 398.1567) radius 2
  circle A96 centre (-447.0796, 198.1567) radius 2
  circle A97 centre (-447.0796, -1.8433) radius 2
  circle A98 centre (-747.0796, 398.1567) radius 2 construction
  circle A99 centre (-747.0796, 198.1567) radius 2
  circle A100 centre (-747.0796, -1.8433) radius 2 construction
  line L257 (-264.55, 388.1567) -> (-245.35, 388.1567)
  line L258 (-245.35, 388.1567) -> (-245.35, 392.1567)
  line L259 (-245.35, 392.1567) -> (-261.55, 392.1567)
  arc A101 (-264.55, 395.1567) -> (-261.55, 392.1567) centre (-261.55, 395.1567) ccw
  line L260 (-260.55, 388.1567) -> (-249.35, 388.1567) construction
  line L261 (-249.35, 388.1567) -> (-249.35, 392.1567) construction
  line L262 (-249.35, 392.1567) -> (-260.55, 392.1567) construction
  line L263 (-260.55, 392.1567) -> (-260.55, 388.1567) construction
  line L264 (-260.55, 388.1567) -> (-249.35, 392.1567) construction
  line L265 (-249.35, 388.1567) -> (-260.55, 392.1567) construction
  line L266 (-264.55, 412) -> (-264.55, 395.1567)
  arc A102 (-157.0796, 106.4587) -> (-171.0796, 106.4587) centre (-164.0796, 106.4587) ccw
  line L267 (-157.0796, 106.4587) -> (-157.0796, 100)
  arc A103 (-157.0796, 306.4587) -> (-171.0796, 306.4587) centre (-164.0796, 306.4587) ccw
  line L268 (-157.0796, 306.4587) -> (-157.0796, 300)
  arc A104 (-157.0796, 506.4587) -> (-171.0796, 506.4587) centre (-164.0796, 506.4587) ccw
  line L269 (-157.0796, 506.4587) -> (-157.0796, 500)
  arc A105 (-457.0796, 106.4587) -> (-471.0796, 106.4587) centre (-464.0796, 106.4587) ccw
  line L270 (-457.0796, 106.4587) -> (-457.0796, 100)
  arc A106 (-457.0796, 306.4587) -> (-471.0796, 306.4587) centre (-464.0796, 306.4587) ccw
  line L271 (-457.0796, 306.4587) -> (-457.0796, 300)
  arc A107 (-457.0796, 506.4587) -> (-471.0796, 506.4587) centre (-464.0796, 506.4587) ccw construction
  line L272 (-457.0796, 506.4587) -> (-457.0796, 500) construction
  point P0 (158.3765, 0)
  point P1 (-148.021, 75)
  point P2 (-128.5398, 50)
  point P3 (-95.6611, 25)
  point P4 (-51.1799, 6.6987)
  point P5 (-155.8997, 93.3013)
  point P6 (-148.021, 275)
  point P7 (-128.5398, 250)
  point P8 (-95.6611, 225)
  point P9 (-51.1799, 206.6987)
  point P10 (-157.0796, 303.4587)
  point P11 (-157.0796, 200)
  point P12 (-171.0796, 303.4587)
  point P13 (-6, 188.1567)
  point P14 (-142.7917, 285.4273)
  point P15 (-148.021, 475)
  point P16 (-128.5398, 450)
  point P17 (-95.6611, 425)
  point P18 (-51.1799, 406.6987)
  point P19 (-157.0796, 503.4587)
  point P20 (-157.0796, 400)
  point P21 (-171.0796, 503.4587)
  point P22 (-6, 388.1567)
  point P23 (-142.7917, 485.4273)
  point P24 (-448.021, 75)
  point P25 (-428.5398, 50)
  point P26 (-395.6611, 25)
  point P27 (-351.1799, 6.6987)
  point P28 (-457.0796, 103.4587)
  point P29 (-457.0796, 0)
  point P30 (-471.0796, 103.4587)
  point P31 (-306, -11.8433)
  point P32 (-442.7917, 85.4273)
  point P33 (-448.021, 275)
  point P34 (-428.5398, 250)
  point P35 (-395.6611, 225)
  point P36 (-351.1799, 206.6987)
  point P37 (-457.0796, 303.4587)
  point P38 (-457.0796, 200)
  point P39 (-471.0796, 303.4587)
  point P40 (-306, 188.1567)
  point P41 (-442.7917, 285.4273)
  point P42 (-448.021, 475)
  point P43 (-428.5398, 450)
  point P44 (-395.6611, 425)
  point P45 (-351.1799, 406.6987)
  point P46 (-457.0796, 503.4587)
  point P47 (-457.0796, 400)
  point P48 (-471.0796, 503.4587)
  point P49 (-306, 388.1567)
  point P50 (-442.7917, 485.4273)
  point P51 (-421.2258, 50.7726)
  point P52 (-392.6255, 29.6644)
  point P53 (-346.6709, 11.6004)
  point P54 (-436.0267, 68.102)
  point P55 (-457.0796, 503.4587)
  point P56 (-504.6796, 390.1567)
  point P57 (-606, 188.1567)
  point P58 (-757.0796, 200)
  point P59 (-748.021, 275)
  point P60 (-728.5398, 250)
  point P61 (-757.0796, 303.4587)
  point P62 (-695.6611, 225)
  point P63 (-651.1799, 206.6987)
  point P64 (-742.7917, 285.4273)
  point P65 (-771.0796, 303.4587)
  point P66 (-804.6796, 190.1567)
  point P67 (-564.55, 188.1567)
  point P68 (-554.95, 190.1567)
  point P69 (-254.95, 390.1567)
  dimension "d43" = 25.75
  dimension "diameter" = 100
  dimension "d8" = 26.1799
  dimension "d14" = 30
  dimension "d15" = 30
  dimension "d16" = 30
  dimension "d32" = 10.625
  dimension "d47" = 8
  dimension "d49" = 2
  dimension "d53" = 21.25
  dimension "d62" = 20.825
  dimension "d123" = 120
  dimension "d126" = 59.109
  dimension "d137" = 2
  dimension "d138" = 90
  dimension "d139" = 90
  dimension "d141" = 7.1
  dimension "d142" = 14
  dimension "d143" = 7.1
  dimension "d144" = 12
  dimension "d145" = 5
  dimension "d146" = 35
  dimension "d147" = 24
  dimension "hole" = 4
  dimension "d155" = 4
  dimension "d156" = 9
  dimension "d157" = 4
  dimension "d158" = 6
  dimension "d159" = 4
  dimension "d160" = 4
  dimension "d241" = 120.891
  dimension "d244" = 120
  dimension "d245" = 30
  dimension "d246" = 3
  dimension "d249" = 200
  dimension "d252" = 300
  dimension "d255" = 120
  dimension "d256" = 5.1701
  dimension "d259" = 0.5
  dimension "d260" = 0.5
  dimension "d261" = 120
  dimension "d262" = 120
  dimension "d264" = 5.1701
  dimension "d265" = 38
  dimension "d268" = 300
  dimension "d275" = 200
  dimension "d288" = 5.1701
  dimension "d289" = 5.1701
  dimension "d290" = 5.1701
  dimension "d291" = 5.1701
  dimension "d292" = 11.2
  dimension "d293" = 4
  dimension "d294" = 4
  dimension "d296" = 3
  dimension "d299" = 300
  dimension "d324" = 11.2
  dimension "d325" = 4
  dimension "d326" = 4
  dimension "d328" = 3
  dimension "d330" = 4
  dimension "d331" = 10
  dimension "d332" = 10
  dimension "d335" = 200
  dimension "d338" = 300
  dimension "d341" = 7.1
  dimension "d342" = 4.6
sketch "Sketch5" plane through (0, 0, 0) normal (0, 0, 1) x (1, 0, 0)
  circle A0 centre (-171.0796, 114.7323) radius 2
  arc A1 (-168.5126, 119.023) -> (-173.6466, 110.4415) centre (-171.0796, 114.7323) ccw construction
  line L0 (-173.6466, 110.4415) -> (-168.5126, 119.023) construction
  line L1 (-137.3368, 94.5451) -> (-171.0796, 114.7323) construction
  line L2 (-137.3368, 94.5451) -> (-143.2815, 84.6085) construction
  line L3 (-141.0754, 84.4005) -> (-135.6205, 93.5183) construction
  line L4 (-142.7917, 85.4273) -> (-141.0754, 84.4005) construction
  line L5 (-173.6466, 110.4415) -> (-138.1875, 89.2276) construction
  line L6 (-138.1875, 89.2276) -> (-133.0535, 97.8091)
  line L7 (-133.0535, 97.8091) -> (-168.5126, 119.023) construction
  line L8 (-159.6382, 113.7138) -> (-159.6382, 107.8873)
  line L9 (-159.6382, 107.8873) -> (-145.3456, 99.3365)
  line L10 (-133.0535, 97.8091) -> (-140.2116, 102.0915)
  line L11 (-152.4919, 103.6119) -> (-153.6918, 101.6062)
  line L12 (-140.2116, 102.0915) -> (-145.3456, 99.3365)
  line L13 (-159.6382, 113.7138) -> (-168.5126, 119.023)
  line L14 (-135.6205, 93.5183) -> (-169.3633, 113.7055) construction
  line L15 (-168.5126, 119.023) -> (-189.9664, 131.858)
  arc A2 (-189.9664, 131.858) -> (-195.1004, 123.2766) centre (-192.5334, 127.5673) ccw
  line L16 (-195.1004, 123.2766) -> (-173.6466, 110.4415)
  line L17 (-142.7917, 85.4273) -> (-141.0754, 84.4005)
  line L18 (-141.0754, 84.4005) -> (-138.1875, 89.2276)
  line L19 (-142.7917, 85.4273) -> (-142.6907, 91.9217)
  line L20 (-142.6907, 91.9217) -> (-173.6466, 110.4415)
  arc A3 (-141.0754, 84.4005) -> (-138.014, 141.6941) centre (-171.0796, 114.7323) ccw construction
  point P0 (0, 0)
  dimension "d346" = 4
  dimension "d347" = 3
  dimension "d356" = 25
  dimension "d357" = 120
extrude "Extrusion3" add sketch "Sketch3" along normal blind 3 contours L89 A104 L269 L92 A72 L171 A35 L102 L101 L98 A40 L99 L100 | L93 L95 L96 A39 L94 A38
properties part number "1linepath"
